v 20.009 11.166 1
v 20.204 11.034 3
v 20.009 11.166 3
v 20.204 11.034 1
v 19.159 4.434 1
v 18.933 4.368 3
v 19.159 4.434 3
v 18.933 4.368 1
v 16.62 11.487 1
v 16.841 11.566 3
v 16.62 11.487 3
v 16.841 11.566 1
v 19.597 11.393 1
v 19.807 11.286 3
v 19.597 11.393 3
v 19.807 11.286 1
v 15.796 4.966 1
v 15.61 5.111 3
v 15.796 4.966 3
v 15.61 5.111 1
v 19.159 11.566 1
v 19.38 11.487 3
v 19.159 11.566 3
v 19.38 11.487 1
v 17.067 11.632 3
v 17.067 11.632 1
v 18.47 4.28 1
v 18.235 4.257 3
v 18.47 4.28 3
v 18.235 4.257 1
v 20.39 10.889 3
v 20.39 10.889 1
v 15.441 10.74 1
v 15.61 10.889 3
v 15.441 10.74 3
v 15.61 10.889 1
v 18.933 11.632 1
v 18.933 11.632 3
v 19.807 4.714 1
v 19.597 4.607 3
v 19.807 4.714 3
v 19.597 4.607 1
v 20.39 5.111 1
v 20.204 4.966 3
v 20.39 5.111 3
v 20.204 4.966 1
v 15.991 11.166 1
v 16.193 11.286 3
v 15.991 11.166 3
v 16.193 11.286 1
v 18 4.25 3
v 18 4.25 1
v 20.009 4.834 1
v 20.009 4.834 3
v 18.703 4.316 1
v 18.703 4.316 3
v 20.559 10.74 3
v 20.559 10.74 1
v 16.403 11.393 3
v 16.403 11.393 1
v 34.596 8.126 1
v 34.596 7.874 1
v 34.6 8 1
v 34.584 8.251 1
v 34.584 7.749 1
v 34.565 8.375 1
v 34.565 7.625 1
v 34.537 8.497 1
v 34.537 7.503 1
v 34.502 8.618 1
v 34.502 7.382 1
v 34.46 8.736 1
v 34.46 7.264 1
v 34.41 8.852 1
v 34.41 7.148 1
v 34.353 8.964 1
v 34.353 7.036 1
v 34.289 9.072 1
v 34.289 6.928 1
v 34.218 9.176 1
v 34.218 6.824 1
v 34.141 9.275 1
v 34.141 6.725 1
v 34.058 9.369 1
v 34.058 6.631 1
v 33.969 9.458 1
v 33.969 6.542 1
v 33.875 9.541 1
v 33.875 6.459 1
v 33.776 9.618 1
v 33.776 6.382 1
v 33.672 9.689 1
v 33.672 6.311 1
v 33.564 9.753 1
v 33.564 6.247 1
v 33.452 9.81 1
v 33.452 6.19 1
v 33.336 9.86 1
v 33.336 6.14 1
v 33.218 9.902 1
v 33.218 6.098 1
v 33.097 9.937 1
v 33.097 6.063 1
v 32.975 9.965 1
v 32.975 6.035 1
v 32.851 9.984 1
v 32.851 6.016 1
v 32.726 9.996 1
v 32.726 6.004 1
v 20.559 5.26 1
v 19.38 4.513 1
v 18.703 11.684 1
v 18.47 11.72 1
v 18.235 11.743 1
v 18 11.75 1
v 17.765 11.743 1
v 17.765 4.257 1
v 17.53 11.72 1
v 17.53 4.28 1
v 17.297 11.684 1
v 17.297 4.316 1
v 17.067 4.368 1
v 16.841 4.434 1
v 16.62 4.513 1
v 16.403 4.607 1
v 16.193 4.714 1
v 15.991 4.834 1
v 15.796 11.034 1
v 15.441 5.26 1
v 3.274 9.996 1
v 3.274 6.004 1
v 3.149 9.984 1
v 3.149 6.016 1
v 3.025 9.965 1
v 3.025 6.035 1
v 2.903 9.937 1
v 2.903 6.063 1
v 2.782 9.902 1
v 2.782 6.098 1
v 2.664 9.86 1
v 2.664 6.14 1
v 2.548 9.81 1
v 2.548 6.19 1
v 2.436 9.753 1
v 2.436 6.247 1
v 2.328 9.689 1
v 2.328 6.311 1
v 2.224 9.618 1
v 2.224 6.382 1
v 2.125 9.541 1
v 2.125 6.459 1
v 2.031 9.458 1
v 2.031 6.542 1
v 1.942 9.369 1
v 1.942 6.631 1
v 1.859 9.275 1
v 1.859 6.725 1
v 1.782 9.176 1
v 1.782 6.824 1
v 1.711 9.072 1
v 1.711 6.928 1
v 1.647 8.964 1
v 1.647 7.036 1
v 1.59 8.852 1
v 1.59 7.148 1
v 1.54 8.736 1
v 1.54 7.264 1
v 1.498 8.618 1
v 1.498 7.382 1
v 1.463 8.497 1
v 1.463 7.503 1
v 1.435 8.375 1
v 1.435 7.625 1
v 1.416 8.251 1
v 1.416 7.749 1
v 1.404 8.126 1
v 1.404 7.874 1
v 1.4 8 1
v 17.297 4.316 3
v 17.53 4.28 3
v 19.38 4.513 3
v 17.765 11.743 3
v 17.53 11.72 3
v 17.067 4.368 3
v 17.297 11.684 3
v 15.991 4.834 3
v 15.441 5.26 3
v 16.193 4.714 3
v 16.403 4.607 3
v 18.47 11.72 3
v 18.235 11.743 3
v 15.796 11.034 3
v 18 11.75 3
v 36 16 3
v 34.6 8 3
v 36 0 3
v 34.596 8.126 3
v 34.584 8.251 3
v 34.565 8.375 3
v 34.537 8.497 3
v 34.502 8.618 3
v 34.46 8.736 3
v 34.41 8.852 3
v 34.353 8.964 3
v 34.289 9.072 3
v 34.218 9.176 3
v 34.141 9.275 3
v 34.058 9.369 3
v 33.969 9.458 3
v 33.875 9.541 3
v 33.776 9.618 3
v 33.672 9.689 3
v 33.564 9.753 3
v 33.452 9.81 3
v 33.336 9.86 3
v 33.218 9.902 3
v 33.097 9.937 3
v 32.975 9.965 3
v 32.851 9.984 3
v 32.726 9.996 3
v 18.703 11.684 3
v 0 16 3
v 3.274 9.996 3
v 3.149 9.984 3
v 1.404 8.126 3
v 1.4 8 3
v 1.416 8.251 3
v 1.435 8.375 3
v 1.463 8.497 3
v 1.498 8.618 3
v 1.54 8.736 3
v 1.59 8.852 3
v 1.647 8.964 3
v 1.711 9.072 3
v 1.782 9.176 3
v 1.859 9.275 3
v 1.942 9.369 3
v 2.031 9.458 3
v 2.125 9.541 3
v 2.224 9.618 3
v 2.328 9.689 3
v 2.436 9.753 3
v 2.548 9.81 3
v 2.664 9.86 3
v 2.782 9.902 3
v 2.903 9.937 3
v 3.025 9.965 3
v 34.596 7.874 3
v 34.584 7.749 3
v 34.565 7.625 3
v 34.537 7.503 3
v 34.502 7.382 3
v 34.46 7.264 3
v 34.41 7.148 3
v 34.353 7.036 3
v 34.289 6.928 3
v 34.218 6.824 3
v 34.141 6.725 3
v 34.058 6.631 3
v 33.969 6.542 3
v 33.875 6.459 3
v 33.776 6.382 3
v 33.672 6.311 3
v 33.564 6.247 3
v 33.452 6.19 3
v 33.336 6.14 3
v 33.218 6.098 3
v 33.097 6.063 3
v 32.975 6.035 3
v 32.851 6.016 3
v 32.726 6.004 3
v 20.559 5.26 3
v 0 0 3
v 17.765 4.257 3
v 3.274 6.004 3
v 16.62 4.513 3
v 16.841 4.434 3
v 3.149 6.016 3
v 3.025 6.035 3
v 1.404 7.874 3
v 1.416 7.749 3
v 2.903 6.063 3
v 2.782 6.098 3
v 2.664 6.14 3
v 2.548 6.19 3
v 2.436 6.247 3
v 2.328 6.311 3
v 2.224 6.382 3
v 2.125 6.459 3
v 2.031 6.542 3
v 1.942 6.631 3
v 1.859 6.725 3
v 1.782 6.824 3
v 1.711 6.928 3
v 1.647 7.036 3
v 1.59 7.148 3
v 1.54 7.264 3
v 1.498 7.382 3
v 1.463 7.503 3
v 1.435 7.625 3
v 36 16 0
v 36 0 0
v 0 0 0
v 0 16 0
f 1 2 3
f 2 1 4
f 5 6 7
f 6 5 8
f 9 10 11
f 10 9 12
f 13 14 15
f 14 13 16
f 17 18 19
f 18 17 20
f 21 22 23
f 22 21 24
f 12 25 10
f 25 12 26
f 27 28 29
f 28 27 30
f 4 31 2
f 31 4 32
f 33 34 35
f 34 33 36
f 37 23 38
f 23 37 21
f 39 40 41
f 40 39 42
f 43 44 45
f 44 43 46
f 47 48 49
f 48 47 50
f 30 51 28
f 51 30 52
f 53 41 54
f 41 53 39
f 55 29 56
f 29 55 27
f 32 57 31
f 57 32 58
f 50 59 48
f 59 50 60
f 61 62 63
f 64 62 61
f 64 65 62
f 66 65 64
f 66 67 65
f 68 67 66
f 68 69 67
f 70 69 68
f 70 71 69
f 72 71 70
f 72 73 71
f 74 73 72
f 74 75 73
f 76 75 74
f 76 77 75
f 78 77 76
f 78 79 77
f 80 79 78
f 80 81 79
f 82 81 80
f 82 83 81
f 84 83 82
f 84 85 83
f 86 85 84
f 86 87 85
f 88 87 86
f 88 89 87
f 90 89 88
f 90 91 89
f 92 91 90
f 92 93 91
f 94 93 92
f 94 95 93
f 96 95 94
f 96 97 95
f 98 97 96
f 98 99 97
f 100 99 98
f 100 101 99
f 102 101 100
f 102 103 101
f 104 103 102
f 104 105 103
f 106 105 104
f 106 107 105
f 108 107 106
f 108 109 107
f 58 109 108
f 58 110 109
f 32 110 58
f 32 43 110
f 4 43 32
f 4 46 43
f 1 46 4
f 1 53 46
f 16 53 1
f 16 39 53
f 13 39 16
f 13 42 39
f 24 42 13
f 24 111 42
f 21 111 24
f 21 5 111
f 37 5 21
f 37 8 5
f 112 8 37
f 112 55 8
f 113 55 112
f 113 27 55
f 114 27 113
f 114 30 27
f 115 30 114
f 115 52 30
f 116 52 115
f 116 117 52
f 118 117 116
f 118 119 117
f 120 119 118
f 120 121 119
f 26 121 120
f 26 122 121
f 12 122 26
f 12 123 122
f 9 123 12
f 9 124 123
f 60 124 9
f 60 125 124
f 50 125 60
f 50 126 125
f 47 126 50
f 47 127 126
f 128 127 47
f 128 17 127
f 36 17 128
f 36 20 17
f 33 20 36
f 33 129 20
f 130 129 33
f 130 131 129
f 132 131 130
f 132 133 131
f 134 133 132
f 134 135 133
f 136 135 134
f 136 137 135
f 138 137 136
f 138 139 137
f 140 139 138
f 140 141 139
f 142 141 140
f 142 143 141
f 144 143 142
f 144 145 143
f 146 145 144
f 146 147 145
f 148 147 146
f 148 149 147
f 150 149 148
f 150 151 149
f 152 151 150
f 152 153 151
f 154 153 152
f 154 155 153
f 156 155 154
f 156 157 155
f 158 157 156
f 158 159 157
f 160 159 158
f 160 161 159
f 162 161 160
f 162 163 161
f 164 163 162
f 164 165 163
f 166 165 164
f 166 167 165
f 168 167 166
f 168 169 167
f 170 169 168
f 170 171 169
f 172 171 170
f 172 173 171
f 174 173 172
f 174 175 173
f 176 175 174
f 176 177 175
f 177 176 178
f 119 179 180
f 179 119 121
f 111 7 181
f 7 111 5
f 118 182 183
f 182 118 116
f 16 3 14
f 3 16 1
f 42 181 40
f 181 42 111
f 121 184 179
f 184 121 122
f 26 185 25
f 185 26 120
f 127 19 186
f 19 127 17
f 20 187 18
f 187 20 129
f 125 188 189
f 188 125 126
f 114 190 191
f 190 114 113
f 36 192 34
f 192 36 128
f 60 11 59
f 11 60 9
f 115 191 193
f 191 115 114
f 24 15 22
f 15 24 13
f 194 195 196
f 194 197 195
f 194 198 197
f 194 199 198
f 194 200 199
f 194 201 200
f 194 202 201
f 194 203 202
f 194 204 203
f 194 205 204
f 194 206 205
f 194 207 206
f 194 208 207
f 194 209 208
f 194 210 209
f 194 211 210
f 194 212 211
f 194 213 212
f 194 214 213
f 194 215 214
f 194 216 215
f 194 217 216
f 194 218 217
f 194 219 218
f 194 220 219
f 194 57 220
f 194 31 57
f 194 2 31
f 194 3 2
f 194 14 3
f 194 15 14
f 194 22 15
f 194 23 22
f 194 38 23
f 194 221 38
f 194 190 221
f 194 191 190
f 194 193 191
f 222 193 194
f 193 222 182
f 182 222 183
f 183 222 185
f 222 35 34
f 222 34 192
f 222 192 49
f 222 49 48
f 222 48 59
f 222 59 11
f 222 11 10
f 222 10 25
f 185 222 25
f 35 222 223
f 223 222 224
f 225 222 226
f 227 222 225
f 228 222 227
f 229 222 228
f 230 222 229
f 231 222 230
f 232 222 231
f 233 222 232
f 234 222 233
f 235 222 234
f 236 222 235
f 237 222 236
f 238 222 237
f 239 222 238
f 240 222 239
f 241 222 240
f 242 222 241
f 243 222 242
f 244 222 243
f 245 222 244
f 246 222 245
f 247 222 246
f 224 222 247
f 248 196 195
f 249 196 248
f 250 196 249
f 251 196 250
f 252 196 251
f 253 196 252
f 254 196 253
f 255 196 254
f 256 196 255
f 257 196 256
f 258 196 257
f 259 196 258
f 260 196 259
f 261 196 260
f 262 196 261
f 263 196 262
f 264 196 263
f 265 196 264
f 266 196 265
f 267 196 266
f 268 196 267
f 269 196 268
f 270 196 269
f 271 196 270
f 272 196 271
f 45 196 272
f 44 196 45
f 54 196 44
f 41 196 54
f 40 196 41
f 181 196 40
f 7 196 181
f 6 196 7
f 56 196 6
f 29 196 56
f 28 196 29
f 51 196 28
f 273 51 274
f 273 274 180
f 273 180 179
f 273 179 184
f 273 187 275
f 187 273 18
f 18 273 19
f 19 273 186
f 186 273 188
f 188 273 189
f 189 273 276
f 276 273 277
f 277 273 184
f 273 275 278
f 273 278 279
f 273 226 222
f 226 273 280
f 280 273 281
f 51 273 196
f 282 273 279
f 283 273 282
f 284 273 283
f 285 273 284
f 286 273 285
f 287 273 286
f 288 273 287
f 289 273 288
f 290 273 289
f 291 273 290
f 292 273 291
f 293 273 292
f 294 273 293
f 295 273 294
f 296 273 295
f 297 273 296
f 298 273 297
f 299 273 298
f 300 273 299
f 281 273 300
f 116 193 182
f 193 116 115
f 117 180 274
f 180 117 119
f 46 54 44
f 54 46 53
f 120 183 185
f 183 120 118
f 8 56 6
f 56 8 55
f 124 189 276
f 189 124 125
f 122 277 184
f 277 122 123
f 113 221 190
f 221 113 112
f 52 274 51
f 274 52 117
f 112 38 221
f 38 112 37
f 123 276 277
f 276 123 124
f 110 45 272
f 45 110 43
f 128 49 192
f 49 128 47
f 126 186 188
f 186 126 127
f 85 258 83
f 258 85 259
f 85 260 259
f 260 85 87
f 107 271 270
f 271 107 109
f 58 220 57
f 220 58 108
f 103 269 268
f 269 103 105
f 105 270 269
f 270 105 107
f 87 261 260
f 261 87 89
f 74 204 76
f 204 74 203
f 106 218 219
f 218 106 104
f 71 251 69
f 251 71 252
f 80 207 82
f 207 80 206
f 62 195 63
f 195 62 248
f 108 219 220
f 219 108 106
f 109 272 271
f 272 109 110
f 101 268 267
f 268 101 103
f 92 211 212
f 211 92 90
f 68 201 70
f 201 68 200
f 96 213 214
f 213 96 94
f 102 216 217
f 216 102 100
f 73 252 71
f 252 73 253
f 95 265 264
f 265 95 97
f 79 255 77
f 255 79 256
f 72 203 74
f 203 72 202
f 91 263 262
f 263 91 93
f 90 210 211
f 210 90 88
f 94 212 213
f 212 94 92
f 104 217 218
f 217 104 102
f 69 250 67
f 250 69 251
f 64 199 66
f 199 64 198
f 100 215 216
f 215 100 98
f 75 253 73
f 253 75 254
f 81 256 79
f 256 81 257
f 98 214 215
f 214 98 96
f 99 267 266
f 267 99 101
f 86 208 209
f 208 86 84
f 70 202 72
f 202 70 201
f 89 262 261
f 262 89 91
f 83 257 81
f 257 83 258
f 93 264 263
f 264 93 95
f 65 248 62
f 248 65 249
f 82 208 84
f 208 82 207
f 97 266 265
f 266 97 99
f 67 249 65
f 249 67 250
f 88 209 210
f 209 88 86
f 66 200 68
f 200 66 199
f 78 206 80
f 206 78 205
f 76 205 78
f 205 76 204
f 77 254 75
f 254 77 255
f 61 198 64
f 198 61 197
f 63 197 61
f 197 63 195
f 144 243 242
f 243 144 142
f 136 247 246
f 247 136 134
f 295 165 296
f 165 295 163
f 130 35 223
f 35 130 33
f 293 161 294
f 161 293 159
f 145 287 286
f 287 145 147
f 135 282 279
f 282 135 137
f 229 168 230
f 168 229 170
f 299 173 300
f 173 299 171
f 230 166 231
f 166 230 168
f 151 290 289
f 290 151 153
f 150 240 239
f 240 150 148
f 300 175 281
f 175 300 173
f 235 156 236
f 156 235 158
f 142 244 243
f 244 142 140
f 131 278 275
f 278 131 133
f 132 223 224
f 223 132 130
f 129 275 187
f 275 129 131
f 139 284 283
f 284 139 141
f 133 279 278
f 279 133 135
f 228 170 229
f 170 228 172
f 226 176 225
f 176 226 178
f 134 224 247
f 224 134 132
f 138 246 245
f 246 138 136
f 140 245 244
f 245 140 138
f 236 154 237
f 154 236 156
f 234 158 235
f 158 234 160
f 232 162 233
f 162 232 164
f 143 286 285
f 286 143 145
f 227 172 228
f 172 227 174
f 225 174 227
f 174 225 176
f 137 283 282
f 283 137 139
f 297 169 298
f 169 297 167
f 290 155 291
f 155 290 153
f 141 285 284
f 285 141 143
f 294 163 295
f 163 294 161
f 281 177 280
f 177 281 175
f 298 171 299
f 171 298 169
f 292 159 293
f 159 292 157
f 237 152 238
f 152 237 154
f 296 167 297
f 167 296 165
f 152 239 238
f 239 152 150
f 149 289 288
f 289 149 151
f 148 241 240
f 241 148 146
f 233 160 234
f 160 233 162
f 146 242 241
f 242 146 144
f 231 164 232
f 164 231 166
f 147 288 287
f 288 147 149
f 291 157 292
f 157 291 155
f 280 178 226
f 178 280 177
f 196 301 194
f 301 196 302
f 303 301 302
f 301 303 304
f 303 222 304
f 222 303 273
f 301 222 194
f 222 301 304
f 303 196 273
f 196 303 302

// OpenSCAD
$fn=100;


difference() {

  
color ("blue") cube ( [36,16,3]);


 union() {
	   
		translate ([18,8,1]) 
		cylinder(h=2,d=7.5,center=false);
 	
	 
   hull() {
 	   color( "Red") 
 	   translate([19.5,8,1]) cylinder ( h=2,d=5.6);
 	   translate([32.6,8,1]) cylinder (h=2,d=4);
	  }

		
   hull () {
 	   color("Red")
 	   translate([16.5,8,1]) cylinder (h=2, d=5.6);
 	   translate([3.4,8,1]) cylinder (h=2,d=4);
	
     }

 }

} 
